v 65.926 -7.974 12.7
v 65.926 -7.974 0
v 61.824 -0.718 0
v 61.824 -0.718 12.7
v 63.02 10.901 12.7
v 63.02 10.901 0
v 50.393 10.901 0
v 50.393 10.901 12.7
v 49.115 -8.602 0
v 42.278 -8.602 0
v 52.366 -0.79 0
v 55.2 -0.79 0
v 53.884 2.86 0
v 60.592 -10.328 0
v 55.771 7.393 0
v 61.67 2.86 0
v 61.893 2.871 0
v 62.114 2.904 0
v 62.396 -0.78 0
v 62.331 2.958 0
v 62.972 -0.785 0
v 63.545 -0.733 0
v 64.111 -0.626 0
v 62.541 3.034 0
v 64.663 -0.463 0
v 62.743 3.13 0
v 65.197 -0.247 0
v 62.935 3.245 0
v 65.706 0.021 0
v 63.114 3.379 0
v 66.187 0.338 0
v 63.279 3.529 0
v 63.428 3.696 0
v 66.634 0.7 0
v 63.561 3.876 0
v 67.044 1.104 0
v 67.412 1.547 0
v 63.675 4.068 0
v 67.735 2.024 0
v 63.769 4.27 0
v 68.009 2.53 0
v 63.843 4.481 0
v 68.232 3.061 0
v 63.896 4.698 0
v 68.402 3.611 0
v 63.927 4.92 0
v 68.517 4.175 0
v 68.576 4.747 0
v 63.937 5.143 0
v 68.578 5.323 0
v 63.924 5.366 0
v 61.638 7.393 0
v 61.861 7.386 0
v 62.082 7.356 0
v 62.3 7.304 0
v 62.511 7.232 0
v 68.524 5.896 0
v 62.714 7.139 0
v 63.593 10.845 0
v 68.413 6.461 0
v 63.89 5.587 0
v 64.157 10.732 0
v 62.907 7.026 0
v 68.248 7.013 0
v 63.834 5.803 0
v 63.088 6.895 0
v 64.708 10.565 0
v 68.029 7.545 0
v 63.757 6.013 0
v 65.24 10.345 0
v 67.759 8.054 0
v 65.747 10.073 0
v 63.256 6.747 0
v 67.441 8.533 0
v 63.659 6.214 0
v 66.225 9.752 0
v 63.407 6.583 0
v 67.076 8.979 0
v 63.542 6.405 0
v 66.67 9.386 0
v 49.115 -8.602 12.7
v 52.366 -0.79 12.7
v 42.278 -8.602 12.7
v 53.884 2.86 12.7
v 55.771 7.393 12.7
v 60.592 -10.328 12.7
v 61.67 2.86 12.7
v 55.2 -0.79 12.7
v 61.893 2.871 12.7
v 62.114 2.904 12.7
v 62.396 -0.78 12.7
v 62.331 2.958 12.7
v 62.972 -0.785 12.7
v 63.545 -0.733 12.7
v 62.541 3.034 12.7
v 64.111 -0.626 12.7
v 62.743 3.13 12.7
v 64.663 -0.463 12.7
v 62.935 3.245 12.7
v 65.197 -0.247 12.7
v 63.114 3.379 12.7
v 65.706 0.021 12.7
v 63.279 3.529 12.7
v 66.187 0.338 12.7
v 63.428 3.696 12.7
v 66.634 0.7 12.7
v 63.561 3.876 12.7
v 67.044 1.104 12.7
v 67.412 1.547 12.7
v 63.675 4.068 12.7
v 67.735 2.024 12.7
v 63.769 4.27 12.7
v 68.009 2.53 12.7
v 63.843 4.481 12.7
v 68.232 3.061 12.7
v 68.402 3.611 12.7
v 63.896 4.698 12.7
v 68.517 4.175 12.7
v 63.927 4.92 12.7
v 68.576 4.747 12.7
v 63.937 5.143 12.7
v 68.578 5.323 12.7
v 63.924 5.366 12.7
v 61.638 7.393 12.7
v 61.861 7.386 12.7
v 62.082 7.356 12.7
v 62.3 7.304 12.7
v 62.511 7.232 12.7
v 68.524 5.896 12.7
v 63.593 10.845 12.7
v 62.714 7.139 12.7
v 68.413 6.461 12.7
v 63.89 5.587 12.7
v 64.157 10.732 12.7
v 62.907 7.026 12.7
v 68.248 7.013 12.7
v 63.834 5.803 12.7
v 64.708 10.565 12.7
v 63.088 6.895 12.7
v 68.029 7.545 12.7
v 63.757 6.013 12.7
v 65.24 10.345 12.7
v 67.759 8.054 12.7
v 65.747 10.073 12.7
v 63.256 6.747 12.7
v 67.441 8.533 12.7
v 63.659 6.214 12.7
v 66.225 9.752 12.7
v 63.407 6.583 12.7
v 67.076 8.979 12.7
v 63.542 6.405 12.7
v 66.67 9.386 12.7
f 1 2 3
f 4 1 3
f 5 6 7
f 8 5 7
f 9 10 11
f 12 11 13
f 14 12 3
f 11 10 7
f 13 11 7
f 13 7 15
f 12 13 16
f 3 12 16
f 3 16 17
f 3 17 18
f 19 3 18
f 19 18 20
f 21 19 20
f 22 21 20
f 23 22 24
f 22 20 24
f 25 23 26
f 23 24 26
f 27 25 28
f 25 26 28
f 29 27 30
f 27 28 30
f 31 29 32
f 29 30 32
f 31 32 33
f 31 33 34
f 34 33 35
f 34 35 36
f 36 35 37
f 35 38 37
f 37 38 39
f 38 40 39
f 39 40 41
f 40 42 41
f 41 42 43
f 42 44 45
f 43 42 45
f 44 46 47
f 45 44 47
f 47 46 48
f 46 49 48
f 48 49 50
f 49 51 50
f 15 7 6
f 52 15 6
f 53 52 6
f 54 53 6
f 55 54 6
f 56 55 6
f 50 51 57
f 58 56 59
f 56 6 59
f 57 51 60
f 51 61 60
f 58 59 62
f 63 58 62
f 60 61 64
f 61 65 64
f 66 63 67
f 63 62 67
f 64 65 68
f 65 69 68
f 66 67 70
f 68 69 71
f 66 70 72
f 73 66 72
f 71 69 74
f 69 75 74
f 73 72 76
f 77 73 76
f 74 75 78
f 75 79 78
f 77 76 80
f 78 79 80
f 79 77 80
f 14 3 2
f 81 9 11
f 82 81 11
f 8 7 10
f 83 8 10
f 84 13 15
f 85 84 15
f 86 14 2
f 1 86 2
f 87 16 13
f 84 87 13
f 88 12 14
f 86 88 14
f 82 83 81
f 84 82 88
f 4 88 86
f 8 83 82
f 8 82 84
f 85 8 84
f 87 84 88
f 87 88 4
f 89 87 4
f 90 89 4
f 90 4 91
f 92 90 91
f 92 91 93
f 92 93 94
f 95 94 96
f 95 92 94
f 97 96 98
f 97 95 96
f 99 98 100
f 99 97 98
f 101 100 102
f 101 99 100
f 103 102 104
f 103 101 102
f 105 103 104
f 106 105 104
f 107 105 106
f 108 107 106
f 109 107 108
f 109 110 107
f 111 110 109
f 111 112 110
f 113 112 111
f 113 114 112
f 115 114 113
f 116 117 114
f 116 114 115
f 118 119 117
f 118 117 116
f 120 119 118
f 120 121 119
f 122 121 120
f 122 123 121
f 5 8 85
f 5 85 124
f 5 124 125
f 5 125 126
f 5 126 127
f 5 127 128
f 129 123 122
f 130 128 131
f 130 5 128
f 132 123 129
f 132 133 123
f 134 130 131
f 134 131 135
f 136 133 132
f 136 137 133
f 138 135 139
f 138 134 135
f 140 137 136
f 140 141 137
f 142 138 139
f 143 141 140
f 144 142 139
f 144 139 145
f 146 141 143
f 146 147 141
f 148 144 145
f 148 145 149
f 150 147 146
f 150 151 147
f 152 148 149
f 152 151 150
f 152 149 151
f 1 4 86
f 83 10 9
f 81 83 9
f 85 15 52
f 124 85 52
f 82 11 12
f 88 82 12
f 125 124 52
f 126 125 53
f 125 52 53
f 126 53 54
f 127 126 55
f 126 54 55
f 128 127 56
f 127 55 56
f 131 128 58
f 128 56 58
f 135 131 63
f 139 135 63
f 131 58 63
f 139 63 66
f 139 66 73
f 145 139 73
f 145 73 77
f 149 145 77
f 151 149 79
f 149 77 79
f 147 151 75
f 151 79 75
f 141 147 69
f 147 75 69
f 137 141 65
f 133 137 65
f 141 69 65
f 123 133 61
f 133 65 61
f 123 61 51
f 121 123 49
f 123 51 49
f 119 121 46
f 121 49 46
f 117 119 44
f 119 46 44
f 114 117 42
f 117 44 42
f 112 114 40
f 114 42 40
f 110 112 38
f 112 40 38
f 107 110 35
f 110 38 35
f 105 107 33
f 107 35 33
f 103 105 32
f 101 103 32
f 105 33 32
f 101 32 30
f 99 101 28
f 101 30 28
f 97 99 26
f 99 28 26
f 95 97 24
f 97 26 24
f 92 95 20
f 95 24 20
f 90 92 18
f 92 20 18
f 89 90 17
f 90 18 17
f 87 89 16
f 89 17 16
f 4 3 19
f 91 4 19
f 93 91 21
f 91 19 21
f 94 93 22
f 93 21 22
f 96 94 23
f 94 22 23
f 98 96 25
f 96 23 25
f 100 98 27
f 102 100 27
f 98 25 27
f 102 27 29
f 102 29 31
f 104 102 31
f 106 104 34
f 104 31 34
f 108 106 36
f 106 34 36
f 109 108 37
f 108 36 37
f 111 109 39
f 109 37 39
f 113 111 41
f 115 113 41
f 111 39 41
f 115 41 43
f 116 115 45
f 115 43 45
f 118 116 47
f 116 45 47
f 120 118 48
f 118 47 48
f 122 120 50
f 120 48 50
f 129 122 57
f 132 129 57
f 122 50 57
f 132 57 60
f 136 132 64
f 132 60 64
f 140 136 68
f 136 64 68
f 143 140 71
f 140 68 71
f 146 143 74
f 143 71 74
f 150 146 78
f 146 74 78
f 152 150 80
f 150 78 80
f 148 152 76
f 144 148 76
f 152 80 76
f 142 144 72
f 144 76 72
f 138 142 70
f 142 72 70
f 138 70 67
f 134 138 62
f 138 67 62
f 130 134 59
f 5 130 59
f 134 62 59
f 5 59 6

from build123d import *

# Parameters (mm, degrees)
F1_DEPTH = 12.7


# Not quite as in the source:
# - a feature names something its author has since deleted; it is built from what else it names


with BuildPart() as f1:
    # F0 (on Top) → F1 (new body)
    with BuildSketch(Plane.XY):
        with BuildLine():
            Line((63.0196762211, 10.9010377465), (50.3931596336, 10.9010377465))
            Line((50.3931596336, 10.9010377465), (42.2776843256, -8.6024441122))
            Line((42.2776843256, -8.6024441122), (49.1147374354, -8.6024441122))
            Line((49.1147374354, -8.6024441122), (52.3656376201, -0.7897319333))
            Line((52.3656376201, -0.7897319333), (55.199665187, -0.7897319333))
            Line((55.199665187, -0.7897319333), (60.5922424733, -10.3281843676))
            Line((60.5922424733, -10.3281843676), (65.9258010509, -7.9737302361))
            Line((65.9258010509, -7.9737302361), (61.8239495523, -0.7183283504))
            ThreePointArc((61.8239495523, -0.7183283504), (68.5532030557, 4.4603851012), (63.0196762211, 10.9010377465))
        make_face()
        with BuildLine():
            Line((53.8841895381, 2.8597215688), (55.7706488767, 7.3933470303))
            Line((55.7706488767, 7.3933470303), (61.637538461, 7.3933470303))
            ThreePointArc((61.637538461, 7.3933470303), (63.9369023486, 5.1428976256), (61.6700313985, 2.8597215688))
            Line((61.6700313985, 2.8597215688), (53.8841895381, 2.8597215688))
        make_face(mode=Mode.SUBTRACT)
    extrude(amount=F1_DEPTH)


solid = f1.part
